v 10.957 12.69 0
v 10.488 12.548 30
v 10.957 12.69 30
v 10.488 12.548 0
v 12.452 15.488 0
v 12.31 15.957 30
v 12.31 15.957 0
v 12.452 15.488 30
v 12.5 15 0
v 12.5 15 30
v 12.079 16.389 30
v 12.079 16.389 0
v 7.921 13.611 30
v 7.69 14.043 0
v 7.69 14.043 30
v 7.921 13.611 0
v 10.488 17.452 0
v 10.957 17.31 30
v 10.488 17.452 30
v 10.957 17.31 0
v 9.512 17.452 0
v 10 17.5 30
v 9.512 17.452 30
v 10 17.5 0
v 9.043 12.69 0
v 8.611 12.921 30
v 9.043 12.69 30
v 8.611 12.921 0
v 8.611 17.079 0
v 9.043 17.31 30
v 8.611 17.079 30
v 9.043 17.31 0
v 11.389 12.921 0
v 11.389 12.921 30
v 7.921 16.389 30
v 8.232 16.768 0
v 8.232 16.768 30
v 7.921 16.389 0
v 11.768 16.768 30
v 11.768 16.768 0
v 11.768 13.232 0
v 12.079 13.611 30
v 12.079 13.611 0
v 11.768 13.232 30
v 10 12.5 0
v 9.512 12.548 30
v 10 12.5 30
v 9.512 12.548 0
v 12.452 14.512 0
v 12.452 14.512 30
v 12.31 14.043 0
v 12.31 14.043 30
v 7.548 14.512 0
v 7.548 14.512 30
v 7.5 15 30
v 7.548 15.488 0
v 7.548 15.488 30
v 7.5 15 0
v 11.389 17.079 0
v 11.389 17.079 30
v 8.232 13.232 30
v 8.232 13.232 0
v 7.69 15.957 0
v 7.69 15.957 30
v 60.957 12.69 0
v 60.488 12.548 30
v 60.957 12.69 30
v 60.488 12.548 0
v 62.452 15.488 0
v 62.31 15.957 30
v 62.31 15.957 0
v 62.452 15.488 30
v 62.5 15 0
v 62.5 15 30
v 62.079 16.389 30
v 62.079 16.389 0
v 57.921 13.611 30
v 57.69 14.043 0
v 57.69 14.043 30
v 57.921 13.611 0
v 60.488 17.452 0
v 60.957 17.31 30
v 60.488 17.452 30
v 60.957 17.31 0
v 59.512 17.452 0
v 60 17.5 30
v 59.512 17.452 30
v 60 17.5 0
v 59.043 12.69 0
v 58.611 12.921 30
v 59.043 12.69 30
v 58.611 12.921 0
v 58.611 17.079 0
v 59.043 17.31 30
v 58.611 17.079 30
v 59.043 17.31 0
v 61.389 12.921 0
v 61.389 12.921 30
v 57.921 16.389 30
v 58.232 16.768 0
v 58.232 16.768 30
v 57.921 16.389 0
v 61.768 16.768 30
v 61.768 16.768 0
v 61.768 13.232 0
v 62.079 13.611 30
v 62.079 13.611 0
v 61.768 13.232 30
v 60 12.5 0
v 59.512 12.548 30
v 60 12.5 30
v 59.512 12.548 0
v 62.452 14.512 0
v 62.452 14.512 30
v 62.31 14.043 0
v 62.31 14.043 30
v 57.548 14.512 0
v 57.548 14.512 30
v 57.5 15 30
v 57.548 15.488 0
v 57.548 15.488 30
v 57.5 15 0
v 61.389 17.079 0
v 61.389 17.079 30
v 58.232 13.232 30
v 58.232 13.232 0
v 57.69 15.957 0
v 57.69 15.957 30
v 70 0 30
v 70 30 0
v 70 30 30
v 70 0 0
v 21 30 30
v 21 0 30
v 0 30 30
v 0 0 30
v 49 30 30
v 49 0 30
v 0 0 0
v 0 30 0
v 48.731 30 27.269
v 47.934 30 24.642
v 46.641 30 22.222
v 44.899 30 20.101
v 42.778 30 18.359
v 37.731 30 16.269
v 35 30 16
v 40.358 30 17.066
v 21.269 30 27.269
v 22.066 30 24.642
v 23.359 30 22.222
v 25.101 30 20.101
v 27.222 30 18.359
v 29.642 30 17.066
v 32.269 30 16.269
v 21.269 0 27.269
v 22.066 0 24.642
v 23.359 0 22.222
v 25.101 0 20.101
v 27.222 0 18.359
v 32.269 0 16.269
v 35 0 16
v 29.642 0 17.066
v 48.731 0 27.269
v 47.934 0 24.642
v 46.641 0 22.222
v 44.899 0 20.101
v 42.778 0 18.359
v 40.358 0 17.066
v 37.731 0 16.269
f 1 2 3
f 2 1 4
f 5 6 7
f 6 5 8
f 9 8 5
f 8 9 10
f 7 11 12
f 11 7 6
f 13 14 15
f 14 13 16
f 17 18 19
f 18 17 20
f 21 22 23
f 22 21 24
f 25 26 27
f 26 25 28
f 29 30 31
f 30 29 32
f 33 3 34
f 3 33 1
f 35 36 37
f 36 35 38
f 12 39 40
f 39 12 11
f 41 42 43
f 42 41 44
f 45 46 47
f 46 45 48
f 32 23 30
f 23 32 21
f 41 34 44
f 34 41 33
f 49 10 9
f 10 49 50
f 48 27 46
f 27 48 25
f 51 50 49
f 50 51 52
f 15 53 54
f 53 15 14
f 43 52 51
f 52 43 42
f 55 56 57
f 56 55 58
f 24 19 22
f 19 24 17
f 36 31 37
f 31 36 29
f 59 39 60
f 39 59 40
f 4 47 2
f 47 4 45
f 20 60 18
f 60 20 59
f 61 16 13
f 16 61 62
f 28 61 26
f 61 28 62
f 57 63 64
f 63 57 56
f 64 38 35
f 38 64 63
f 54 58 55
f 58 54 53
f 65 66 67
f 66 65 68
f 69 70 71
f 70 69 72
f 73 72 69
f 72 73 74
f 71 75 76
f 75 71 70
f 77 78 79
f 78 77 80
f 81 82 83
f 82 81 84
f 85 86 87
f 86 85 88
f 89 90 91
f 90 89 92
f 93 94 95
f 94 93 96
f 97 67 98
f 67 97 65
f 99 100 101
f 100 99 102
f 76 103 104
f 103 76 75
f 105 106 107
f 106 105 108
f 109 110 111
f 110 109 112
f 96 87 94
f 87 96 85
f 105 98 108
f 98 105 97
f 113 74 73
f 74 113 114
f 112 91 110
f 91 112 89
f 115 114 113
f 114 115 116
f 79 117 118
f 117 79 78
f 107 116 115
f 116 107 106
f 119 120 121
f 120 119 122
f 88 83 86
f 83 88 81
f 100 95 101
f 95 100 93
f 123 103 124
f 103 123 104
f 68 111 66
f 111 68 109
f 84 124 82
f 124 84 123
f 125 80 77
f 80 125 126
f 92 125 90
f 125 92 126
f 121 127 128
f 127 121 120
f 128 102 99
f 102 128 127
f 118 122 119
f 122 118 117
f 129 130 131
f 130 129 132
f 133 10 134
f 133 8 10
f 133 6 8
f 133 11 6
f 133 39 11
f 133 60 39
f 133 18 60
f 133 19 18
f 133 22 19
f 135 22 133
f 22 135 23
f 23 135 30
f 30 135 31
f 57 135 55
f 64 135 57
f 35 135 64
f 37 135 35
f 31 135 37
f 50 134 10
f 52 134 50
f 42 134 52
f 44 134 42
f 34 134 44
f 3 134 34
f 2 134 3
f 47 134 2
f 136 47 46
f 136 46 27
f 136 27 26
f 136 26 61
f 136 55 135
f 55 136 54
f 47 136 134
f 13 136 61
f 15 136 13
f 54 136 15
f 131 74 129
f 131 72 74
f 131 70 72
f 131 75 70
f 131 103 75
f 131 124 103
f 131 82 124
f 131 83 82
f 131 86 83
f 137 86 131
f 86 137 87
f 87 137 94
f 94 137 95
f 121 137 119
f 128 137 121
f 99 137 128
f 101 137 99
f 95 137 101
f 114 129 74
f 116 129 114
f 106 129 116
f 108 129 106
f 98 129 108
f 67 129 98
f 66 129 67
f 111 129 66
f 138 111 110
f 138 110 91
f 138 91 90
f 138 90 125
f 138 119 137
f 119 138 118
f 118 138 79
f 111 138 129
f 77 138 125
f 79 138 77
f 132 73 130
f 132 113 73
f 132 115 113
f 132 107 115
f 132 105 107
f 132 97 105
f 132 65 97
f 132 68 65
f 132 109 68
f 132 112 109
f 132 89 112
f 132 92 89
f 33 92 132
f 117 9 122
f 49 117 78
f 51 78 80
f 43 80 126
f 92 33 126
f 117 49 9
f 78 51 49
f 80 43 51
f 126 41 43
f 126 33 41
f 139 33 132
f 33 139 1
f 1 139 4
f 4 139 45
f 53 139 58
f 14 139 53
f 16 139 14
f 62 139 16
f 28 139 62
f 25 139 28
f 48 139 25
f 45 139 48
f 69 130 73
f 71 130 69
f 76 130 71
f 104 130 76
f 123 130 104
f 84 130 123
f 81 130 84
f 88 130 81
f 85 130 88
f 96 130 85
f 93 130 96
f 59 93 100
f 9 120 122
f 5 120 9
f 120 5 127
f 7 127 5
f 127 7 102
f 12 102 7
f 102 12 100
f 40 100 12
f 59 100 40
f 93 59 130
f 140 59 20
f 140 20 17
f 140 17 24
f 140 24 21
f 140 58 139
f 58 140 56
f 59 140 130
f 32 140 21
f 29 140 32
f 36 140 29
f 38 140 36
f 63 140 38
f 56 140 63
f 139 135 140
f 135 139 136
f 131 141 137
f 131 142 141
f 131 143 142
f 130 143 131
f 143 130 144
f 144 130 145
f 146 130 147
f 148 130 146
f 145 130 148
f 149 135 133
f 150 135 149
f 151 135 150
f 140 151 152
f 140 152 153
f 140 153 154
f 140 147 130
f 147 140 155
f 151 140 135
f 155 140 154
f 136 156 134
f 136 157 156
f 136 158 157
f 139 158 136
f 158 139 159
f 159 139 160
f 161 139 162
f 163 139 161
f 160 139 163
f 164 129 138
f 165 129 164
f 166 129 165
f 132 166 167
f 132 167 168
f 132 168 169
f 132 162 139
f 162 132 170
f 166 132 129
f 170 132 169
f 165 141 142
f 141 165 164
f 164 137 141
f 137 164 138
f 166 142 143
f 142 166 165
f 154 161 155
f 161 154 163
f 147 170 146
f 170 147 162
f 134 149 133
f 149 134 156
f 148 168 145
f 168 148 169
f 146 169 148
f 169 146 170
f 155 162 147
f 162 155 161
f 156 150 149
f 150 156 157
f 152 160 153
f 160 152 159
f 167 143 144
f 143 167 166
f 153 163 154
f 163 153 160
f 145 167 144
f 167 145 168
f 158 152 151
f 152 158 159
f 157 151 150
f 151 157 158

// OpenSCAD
$fn = 32;

// ----------------------------------------------------------------------
// Saddle clamp: plain shaft clamp
// ----------------------------------------------------------------------

// --- parameters (mm) ---
blk_l = 70;               // block length, X
blk_w = 30;               // block width, Y
blk_h = 30;               // block height
clamp_r = 14;             // shaft groove radius
hole_r = 2.5;             // bolt hole radius
hole_m = 10;              // bolt hole margin from the ends

saw_depth = clamp_r + 3;  // saw kerf depth

difference() {
  cube([blk_l, blk_w, blk_h]);
  translate([blk_l / 2, -1, blk_h])
    rotate([-90, 0, 0])
      cylinder(h = blk_w + 2, r = clamp_r);
  for (sx = [0, 1])
    translate([sx ? blk_l - hole_m : hole_m, blk_w / 2, -1])
      cylinder(r = hole_r, h = blk_h + 2);
}
